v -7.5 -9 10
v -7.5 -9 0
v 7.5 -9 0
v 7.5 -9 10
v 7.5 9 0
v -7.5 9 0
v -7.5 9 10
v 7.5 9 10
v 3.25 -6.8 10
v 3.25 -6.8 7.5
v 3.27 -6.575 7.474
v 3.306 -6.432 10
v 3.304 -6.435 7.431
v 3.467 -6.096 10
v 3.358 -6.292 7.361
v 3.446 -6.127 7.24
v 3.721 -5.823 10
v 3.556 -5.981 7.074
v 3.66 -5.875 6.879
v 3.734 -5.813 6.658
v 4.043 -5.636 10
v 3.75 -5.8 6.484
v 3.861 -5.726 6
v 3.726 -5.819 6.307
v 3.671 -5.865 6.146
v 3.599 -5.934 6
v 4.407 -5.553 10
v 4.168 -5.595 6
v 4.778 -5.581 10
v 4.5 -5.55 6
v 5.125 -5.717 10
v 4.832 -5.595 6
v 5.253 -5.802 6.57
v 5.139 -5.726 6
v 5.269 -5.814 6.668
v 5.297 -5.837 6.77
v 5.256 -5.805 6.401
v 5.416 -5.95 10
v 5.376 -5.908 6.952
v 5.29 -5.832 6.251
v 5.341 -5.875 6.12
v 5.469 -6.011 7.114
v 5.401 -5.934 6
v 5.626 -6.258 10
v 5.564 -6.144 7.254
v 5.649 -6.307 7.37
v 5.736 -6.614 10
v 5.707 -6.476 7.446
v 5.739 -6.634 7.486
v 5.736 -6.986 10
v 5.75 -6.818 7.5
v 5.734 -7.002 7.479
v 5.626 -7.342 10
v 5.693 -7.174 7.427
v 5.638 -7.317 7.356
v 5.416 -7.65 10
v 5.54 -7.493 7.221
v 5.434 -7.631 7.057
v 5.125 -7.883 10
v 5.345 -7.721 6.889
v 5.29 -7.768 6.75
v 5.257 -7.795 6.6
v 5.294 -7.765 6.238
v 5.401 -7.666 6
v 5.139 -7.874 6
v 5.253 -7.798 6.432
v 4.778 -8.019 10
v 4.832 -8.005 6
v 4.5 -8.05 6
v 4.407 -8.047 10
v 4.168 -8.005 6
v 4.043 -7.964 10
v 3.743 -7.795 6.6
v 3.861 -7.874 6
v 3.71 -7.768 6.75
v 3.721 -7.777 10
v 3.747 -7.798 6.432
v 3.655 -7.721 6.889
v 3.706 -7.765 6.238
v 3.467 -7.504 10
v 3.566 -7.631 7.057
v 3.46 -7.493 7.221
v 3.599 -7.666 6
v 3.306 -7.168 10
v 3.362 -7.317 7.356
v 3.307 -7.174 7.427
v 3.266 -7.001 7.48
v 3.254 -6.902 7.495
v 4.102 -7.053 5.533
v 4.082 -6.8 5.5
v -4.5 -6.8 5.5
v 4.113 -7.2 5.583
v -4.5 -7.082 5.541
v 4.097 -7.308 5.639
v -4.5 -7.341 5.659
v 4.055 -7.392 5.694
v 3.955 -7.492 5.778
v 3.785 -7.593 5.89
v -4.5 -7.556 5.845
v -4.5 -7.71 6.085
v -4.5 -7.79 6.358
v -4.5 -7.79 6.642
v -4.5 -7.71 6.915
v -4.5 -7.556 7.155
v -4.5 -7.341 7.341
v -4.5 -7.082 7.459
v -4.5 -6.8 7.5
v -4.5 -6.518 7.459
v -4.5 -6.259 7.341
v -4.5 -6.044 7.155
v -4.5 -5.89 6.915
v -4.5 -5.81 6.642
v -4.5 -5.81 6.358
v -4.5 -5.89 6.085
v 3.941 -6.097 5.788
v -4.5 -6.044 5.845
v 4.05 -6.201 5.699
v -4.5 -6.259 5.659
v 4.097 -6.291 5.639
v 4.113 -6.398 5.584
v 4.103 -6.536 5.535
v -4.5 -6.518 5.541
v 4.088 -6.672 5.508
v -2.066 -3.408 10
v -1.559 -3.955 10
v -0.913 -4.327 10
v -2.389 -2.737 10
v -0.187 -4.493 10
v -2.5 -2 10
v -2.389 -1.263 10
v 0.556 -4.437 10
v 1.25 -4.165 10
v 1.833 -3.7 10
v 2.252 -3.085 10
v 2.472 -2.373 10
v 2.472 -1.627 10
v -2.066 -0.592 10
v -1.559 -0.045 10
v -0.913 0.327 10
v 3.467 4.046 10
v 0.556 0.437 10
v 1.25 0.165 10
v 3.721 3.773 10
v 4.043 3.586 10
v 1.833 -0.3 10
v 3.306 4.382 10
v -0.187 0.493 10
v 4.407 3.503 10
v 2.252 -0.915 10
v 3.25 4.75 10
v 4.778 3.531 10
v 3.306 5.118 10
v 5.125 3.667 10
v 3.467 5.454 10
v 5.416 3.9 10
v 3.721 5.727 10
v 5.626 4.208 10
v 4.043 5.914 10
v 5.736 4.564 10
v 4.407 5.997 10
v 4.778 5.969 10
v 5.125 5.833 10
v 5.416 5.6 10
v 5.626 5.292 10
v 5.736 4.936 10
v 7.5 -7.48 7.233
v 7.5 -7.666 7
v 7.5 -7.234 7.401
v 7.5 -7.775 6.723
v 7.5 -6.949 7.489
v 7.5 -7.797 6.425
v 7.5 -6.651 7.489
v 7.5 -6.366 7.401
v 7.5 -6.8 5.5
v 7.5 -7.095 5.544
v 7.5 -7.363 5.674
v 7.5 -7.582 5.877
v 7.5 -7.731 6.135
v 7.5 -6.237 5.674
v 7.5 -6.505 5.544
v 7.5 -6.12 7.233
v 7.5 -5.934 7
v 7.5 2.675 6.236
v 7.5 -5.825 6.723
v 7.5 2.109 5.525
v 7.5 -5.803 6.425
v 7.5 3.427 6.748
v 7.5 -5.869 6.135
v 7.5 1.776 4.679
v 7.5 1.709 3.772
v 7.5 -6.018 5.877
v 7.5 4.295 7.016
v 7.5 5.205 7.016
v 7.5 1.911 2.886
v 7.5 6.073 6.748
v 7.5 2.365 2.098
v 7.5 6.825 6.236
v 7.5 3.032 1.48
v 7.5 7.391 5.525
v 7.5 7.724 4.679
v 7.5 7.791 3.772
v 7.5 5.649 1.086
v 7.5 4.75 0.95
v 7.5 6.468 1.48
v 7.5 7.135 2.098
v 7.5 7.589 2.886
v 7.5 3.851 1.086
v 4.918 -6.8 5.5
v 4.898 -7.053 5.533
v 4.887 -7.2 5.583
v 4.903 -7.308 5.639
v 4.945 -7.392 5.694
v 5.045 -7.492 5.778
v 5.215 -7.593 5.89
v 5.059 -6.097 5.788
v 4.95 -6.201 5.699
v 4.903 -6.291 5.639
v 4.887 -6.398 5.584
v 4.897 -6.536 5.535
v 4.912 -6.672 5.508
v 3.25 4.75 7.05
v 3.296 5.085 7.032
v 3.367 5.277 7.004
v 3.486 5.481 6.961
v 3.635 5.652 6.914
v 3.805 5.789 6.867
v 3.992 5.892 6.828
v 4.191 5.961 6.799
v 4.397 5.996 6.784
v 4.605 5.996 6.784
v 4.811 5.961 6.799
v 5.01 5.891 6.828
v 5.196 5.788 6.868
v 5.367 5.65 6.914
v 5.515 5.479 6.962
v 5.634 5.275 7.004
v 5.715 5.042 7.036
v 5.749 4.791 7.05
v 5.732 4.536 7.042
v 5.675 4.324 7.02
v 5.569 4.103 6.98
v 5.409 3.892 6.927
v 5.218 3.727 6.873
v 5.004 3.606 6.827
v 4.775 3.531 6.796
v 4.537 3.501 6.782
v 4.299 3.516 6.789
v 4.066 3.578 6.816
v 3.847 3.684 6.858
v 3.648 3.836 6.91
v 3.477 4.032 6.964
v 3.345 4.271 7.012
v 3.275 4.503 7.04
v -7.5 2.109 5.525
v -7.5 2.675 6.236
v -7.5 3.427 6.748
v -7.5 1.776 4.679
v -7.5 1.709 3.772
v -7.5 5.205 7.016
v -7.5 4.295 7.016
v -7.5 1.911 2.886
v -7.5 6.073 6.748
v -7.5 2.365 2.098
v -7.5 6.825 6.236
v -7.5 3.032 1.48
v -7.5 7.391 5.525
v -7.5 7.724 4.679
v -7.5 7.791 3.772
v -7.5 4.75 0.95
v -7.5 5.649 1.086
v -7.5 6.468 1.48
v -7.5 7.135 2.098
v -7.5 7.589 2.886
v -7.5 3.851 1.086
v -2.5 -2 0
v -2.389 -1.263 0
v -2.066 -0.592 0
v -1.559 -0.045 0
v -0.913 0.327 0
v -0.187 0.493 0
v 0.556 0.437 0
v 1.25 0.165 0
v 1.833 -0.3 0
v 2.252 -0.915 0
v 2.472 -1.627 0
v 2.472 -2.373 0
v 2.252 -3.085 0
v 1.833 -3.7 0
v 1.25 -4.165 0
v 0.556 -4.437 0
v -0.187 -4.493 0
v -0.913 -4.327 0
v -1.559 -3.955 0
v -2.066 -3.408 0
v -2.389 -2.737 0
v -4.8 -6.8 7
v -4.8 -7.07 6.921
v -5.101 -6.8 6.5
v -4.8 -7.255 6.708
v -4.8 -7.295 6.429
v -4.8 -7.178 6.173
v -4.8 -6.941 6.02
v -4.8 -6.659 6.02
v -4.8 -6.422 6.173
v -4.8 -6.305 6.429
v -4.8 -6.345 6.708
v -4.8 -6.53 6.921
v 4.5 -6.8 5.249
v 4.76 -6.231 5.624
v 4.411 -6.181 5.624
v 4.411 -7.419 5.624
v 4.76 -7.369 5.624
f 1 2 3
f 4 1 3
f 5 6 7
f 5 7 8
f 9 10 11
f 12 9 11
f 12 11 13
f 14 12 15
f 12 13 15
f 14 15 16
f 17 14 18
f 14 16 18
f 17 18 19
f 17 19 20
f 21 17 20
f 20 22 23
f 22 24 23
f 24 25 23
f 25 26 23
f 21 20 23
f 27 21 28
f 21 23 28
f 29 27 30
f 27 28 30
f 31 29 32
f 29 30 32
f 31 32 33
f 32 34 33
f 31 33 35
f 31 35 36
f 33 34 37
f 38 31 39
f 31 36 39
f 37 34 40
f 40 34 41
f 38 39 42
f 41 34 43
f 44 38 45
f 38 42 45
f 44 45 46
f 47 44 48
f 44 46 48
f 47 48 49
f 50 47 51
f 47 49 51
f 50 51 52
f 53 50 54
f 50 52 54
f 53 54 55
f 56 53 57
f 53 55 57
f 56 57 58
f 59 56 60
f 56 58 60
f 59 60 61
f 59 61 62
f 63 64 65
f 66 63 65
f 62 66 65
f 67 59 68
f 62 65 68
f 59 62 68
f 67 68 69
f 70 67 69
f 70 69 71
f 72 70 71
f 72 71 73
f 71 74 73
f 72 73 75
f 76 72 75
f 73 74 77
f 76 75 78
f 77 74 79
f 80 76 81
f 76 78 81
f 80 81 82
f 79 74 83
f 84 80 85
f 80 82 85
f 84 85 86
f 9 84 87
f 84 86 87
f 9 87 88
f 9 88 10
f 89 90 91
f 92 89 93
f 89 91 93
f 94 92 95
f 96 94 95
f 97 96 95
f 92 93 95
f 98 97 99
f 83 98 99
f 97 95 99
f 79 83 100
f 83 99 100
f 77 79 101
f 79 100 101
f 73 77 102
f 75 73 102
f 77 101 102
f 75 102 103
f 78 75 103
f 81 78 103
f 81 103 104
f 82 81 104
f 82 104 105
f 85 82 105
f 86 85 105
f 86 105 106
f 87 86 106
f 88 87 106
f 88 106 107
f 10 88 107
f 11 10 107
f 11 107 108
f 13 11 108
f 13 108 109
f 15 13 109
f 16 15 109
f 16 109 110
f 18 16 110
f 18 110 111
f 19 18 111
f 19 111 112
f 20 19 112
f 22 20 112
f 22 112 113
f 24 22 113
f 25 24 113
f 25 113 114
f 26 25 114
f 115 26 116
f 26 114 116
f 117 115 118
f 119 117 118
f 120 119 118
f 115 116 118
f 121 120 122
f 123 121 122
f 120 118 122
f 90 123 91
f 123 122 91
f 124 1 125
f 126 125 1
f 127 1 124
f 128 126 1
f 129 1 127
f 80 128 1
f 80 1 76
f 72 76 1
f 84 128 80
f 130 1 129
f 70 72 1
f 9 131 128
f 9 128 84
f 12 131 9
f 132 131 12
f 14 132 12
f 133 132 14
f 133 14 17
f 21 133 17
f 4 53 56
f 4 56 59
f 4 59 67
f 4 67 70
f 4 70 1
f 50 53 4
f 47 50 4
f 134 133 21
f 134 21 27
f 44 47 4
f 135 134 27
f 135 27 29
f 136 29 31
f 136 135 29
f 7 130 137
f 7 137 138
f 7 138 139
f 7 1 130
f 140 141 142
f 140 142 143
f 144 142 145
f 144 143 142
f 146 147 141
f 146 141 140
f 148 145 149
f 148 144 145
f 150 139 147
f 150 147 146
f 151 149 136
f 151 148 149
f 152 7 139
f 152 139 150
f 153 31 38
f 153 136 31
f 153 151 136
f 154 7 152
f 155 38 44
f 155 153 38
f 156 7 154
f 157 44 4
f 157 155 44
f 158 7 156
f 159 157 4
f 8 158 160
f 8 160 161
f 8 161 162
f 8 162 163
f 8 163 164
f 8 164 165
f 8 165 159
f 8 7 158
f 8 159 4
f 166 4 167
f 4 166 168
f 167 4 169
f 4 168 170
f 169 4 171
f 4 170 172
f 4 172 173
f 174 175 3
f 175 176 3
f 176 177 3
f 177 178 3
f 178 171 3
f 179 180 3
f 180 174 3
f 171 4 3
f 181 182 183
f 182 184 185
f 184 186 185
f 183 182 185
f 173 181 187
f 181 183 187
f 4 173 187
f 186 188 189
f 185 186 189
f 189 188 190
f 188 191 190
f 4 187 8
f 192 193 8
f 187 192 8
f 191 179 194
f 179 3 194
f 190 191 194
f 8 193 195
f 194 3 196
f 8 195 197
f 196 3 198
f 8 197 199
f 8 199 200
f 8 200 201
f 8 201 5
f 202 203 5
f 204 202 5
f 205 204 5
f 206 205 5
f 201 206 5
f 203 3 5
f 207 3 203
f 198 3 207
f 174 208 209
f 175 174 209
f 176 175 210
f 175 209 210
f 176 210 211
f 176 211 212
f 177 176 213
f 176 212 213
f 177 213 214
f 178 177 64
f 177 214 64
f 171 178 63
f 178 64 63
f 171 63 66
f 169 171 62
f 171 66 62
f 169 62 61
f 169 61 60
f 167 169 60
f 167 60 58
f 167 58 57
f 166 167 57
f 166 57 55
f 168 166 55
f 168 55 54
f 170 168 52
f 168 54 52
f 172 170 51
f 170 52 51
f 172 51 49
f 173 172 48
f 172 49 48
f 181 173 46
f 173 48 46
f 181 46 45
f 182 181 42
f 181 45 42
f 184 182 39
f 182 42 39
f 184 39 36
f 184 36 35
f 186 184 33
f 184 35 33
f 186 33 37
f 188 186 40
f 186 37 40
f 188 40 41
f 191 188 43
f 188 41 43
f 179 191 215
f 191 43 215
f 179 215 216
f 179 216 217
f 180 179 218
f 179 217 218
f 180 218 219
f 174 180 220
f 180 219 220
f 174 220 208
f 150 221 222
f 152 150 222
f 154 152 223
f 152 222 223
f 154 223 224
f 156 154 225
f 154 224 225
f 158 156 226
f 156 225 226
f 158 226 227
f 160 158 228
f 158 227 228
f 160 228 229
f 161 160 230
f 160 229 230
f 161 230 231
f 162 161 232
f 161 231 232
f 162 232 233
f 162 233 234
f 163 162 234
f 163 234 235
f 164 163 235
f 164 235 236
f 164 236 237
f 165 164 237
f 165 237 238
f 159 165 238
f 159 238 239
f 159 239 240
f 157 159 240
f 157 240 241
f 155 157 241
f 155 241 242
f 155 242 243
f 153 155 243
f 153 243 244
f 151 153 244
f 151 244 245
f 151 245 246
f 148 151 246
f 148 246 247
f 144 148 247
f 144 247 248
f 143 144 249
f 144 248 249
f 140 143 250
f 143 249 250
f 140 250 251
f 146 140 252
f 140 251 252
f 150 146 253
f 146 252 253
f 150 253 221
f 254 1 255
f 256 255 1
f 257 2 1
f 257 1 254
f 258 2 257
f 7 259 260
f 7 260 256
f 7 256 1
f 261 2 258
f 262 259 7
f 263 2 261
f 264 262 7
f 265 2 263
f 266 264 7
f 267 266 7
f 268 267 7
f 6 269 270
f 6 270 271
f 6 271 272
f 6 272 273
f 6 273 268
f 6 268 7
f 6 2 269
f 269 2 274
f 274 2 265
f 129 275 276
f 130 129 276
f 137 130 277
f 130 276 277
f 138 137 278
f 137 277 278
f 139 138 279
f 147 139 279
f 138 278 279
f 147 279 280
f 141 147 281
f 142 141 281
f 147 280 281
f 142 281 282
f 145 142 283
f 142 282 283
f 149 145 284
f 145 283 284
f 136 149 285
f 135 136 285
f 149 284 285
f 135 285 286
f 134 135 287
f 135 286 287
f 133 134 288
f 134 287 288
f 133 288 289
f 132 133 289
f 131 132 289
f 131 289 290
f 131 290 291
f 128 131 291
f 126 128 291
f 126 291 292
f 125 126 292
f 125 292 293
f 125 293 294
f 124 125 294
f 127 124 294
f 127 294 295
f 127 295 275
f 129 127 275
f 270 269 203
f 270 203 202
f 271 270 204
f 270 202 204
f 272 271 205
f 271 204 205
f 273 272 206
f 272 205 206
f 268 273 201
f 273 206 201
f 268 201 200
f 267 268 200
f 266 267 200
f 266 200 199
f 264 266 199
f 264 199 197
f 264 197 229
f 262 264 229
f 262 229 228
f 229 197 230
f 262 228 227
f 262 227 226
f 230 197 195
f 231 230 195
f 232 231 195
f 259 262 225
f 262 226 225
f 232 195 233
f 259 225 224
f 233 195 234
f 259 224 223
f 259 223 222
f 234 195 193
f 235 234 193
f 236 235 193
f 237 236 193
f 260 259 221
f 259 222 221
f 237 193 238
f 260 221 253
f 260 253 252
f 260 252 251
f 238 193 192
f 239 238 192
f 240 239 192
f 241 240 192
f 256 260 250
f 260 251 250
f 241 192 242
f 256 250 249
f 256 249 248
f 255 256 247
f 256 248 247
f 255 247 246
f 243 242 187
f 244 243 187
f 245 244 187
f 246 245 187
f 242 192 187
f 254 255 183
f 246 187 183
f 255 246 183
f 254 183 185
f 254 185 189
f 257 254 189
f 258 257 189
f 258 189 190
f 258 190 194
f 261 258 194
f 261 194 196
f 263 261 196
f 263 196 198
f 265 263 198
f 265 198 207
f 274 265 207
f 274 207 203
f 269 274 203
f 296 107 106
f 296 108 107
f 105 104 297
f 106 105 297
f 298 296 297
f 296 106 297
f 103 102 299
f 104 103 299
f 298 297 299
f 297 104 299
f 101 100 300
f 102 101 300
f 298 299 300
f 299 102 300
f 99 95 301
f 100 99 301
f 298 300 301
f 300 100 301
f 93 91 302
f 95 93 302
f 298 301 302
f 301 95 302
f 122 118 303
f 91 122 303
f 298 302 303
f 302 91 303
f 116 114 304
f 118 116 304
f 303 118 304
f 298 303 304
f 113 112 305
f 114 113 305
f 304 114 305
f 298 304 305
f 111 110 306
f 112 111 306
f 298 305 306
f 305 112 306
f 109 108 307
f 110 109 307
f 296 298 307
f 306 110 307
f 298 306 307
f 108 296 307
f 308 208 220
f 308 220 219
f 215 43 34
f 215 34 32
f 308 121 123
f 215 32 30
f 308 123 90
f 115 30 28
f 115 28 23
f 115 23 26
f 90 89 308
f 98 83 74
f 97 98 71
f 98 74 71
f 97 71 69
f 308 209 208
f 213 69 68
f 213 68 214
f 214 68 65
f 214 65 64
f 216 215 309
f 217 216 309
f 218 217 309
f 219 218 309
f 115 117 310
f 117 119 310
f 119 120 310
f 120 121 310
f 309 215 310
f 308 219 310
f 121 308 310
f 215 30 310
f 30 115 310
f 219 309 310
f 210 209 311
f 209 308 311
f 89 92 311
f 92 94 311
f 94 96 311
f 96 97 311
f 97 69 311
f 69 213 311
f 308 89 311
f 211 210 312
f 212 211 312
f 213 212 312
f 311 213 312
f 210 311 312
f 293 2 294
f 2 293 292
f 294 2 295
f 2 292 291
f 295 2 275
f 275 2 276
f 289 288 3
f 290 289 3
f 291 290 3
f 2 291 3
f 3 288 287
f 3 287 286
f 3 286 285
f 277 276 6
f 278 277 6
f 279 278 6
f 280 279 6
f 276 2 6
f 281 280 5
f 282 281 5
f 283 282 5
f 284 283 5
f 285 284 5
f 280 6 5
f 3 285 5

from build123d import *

# Parameters (mm, degrees)
SKETCH1_W                           = 15
SKETCH1_H                           = 18
BOSS_EXTRUDE1_DEPTH                 = 10
SKETCH2_R                           = 2.5
CUT_EXTRUDE1_DEPTH                  = 11
SKETCH3_R                           = 3.05
CUT_EXTRUDE2_DEPTH                  = 16
TALADRO_ROSCADO_M31_D               = 2.5
TALADRO_ROSCADO_M31_DEPTH           = 4
TALADRO_ROSCADO_M31_TIP             = 0.751075774
DI_METRO_DE_TALADRO_2_8_2_8_1_D     = 2
DI_METRO_DE_TALADRO_2_8_2_8_1_DEPTH = 12
DI_METRO_DE_TALADRO_2_8_2_8_1_TIP   = 0.600860619


with BuildPart() as part:
    # Sketch1 → Boss-Extrude1 (new body)
    with BuildSketch(Plane.XY):
        Rectangle(SKETCH1_W, SKETCH1_H)
    extrude(amount=BOSS_EXTRUDE1_DEPTH)

    # Sketch2 → Cut-Extrude1 (cut, through all)
    with BuildSketch(Plane(origin=(0, 0, 0), x_dir=(-1, 0, 0), z_dir=(0, 0, -1))):
        with Locations((0, -2)):
            Circle(SKETCH2_R)
    extrude(amount=-CUT_EXTRUDE1_DEPTH, mode=Mode.SUBTRACT)

    # Sketch3 → Cut-Extrude2 (cut, through all)
    with BuildSketch(Plane(origin=(7.5, 0, 0), x_dir=(0, 0, -1), z_dir=(1, 0, 0))):
        with Locations((-4, 4.75)):
            Circle(SKETCH3_R)
    extrude(amount=-CUT_EXTRUDE2_DEPTH, mode=Mode.SUBTRACT)

    # Taladro roscado M31
    with Locations(Plane(origin=(-2.648652683, -2.97524228, 10), x_dir=(1, 0, 0), z_dir=(0, 0, 1))):
        with Locations((7.148652683, 7.72524228), (7.148652683, -3.82475772)):
            Hole(TALADRO_ROSCADO_M31_D / 2, depth=TALADRO_ROSCADO_M31_DEPTH)
            with Locations((0, 0, -(TALADRO_ROSCADO_M31_DEPTH + TALADRO_ROSCADO_M31_TIP / 2))):  # 118° drill point
                Cone(0, TALADRO_ROSCADO_M31_D / 2, TALADRO_ROSCADO_M31_TIP, mode=Mode.SUBTRACT)

    # Diámetro de taladro Ø2.8 (2.8)1
    with Locations(Plane(origin=(7.5, -6.8, 6.5), x_dir=(0, 0, 1), z_dir=(1, 0, 0))):
        with Locations((0, 0)):
            Hole(DI_METRO_DE_TALADRO_2_8_2_8_1_D / 2, depth=DI_METRO_DE_TALADRO_2_8_2_8_1_DEPTH)
            with Locations((0, 0, -(DI_METRO_DE_TALADRO_2_8_2_8_1_DEPTH + DI_METRO_DE_TALADRO_2_8_2_8_1_TIP / 2))):  # 118° drill point
                Cone(0, DI_METRO_DE_TALADRO_2_8_2_8_1_D / 2, DI_METRO_DE_TALADRO_2_8_2_8_1_TIP, mode=Mode.SUBTRACT)


solid = part.part
